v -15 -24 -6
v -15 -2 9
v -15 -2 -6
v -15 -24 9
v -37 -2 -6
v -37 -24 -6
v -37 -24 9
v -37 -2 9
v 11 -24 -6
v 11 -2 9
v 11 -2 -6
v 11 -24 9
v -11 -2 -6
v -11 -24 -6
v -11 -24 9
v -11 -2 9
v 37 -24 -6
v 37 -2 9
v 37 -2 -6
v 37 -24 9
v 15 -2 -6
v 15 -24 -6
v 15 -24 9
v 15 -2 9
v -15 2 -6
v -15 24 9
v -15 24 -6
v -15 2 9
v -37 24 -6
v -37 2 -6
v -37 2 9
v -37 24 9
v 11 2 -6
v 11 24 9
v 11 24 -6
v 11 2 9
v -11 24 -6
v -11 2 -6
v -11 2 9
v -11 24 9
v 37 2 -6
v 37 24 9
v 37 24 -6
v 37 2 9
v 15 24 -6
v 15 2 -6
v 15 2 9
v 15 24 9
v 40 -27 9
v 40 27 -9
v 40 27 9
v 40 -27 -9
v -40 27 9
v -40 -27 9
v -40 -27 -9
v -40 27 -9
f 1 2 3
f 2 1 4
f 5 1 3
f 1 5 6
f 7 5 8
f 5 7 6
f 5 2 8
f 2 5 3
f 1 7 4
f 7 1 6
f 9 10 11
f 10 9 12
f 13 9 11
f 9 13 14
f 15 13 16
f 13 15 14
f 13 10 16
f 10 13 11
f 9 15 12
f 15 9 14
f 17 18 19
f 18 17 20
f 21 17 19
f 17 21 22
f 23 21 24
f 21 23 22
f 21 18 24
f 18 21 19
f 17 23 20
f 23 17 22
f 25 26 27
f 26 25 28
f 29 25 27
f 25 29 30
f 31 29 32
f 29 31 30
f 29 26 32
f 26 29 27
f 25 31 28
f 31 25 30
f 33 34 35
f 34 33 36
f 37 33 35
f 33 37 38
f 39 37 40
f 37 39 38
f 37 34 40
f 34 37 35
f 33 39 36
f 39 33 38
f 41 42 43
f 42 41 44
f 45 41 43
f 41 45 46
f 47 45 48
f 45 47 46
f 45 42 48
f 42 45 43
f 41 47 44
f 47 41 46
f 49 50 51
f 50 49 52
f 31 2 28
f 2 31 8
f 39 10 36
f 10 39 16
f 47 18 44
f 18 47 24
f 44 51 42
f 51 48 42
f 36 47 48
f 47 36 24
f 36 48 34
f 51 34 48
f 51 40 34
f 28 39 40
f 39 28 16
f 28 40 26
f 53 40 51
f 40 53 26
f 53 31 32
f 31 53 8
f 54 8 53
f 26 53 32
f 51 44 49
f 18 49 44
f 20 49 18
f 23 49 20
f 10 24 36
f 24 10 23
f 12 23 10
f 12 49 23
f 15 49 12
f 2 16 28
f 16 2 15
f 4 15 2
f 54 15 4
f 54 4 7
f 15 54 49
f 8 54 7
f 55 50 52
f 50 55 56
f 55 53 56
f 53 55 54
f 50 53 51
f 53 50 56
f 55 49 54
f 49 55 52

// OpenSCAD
$fn = 32;

// ----------------------------------------------------------------------
// Pocket plate 80 x 54 x 18
// 2 x 3 pockets 22 mm square, 15 mm deep
// ----------------------------------------------------------------------

// --- parameters (mm) ---
thickness = 18;  // plate thickness
floor_t = 3;     // material left under each pocket
pocket = 22;     // pocket side length
pitch_x = 26;    // pocket pitch along X
pitch_y = 26;    // pocket pitch along Y
cols = 3;        // pockets per row
rows = 2;        // rows of pockets

// --- derived feature positions (mm) ---
depth = thickness - floor_t;        // = 15   pocket depth, down to the floor
span_x = (cols - 1) * pitch_x;      // = 52   distance between outer pockets
span_y = (rows - 1) * pitch_y;      // = 26   distance between outer pocket rows
origin_x = -span_x / 2;             // = -26   X of the first pocket
origin_y = -span_y / 2;             // = -13   Y of the first pocket
plate = [span_x + pocket + 6, span_y + pocket + 6, thickness];  // = [80, 54, 18]   overall size: pockets plus 3 mm of wall on each side
feature_centers = [
  [origin_x + 0 * pitch_x, origin_y + 0 * pitch_y],
  [origin_x + 1 * pitch_x, origin_y + 0 * pitch_y],
  [origin_x + 2 * pitch_x, origin_y + 0 * pitch_y],
  [origin_x + 0 * pitch_x, origin_y + 1 * pitch_y],
  [origin_x + 1 * pitch_x, origin_y + 1 * pitch_y],
  [origin_x + 2 * pitch_x, origin_y + 1 * pitch_y]
];   // pocket centres, used verbatim by the cutter loop

// plate outline, then one pocket per centre in feature_centers
difference() {
  cube(plate, center = true);
  for (centre = feature_centers)
    translate([centre[0] - pocket / 2, centre[1] - pocket / 2, plate[2] / 2 - depth])
      cube([pocket, pocket, depth + 1]);  // centred on the declared pocket centre
}
